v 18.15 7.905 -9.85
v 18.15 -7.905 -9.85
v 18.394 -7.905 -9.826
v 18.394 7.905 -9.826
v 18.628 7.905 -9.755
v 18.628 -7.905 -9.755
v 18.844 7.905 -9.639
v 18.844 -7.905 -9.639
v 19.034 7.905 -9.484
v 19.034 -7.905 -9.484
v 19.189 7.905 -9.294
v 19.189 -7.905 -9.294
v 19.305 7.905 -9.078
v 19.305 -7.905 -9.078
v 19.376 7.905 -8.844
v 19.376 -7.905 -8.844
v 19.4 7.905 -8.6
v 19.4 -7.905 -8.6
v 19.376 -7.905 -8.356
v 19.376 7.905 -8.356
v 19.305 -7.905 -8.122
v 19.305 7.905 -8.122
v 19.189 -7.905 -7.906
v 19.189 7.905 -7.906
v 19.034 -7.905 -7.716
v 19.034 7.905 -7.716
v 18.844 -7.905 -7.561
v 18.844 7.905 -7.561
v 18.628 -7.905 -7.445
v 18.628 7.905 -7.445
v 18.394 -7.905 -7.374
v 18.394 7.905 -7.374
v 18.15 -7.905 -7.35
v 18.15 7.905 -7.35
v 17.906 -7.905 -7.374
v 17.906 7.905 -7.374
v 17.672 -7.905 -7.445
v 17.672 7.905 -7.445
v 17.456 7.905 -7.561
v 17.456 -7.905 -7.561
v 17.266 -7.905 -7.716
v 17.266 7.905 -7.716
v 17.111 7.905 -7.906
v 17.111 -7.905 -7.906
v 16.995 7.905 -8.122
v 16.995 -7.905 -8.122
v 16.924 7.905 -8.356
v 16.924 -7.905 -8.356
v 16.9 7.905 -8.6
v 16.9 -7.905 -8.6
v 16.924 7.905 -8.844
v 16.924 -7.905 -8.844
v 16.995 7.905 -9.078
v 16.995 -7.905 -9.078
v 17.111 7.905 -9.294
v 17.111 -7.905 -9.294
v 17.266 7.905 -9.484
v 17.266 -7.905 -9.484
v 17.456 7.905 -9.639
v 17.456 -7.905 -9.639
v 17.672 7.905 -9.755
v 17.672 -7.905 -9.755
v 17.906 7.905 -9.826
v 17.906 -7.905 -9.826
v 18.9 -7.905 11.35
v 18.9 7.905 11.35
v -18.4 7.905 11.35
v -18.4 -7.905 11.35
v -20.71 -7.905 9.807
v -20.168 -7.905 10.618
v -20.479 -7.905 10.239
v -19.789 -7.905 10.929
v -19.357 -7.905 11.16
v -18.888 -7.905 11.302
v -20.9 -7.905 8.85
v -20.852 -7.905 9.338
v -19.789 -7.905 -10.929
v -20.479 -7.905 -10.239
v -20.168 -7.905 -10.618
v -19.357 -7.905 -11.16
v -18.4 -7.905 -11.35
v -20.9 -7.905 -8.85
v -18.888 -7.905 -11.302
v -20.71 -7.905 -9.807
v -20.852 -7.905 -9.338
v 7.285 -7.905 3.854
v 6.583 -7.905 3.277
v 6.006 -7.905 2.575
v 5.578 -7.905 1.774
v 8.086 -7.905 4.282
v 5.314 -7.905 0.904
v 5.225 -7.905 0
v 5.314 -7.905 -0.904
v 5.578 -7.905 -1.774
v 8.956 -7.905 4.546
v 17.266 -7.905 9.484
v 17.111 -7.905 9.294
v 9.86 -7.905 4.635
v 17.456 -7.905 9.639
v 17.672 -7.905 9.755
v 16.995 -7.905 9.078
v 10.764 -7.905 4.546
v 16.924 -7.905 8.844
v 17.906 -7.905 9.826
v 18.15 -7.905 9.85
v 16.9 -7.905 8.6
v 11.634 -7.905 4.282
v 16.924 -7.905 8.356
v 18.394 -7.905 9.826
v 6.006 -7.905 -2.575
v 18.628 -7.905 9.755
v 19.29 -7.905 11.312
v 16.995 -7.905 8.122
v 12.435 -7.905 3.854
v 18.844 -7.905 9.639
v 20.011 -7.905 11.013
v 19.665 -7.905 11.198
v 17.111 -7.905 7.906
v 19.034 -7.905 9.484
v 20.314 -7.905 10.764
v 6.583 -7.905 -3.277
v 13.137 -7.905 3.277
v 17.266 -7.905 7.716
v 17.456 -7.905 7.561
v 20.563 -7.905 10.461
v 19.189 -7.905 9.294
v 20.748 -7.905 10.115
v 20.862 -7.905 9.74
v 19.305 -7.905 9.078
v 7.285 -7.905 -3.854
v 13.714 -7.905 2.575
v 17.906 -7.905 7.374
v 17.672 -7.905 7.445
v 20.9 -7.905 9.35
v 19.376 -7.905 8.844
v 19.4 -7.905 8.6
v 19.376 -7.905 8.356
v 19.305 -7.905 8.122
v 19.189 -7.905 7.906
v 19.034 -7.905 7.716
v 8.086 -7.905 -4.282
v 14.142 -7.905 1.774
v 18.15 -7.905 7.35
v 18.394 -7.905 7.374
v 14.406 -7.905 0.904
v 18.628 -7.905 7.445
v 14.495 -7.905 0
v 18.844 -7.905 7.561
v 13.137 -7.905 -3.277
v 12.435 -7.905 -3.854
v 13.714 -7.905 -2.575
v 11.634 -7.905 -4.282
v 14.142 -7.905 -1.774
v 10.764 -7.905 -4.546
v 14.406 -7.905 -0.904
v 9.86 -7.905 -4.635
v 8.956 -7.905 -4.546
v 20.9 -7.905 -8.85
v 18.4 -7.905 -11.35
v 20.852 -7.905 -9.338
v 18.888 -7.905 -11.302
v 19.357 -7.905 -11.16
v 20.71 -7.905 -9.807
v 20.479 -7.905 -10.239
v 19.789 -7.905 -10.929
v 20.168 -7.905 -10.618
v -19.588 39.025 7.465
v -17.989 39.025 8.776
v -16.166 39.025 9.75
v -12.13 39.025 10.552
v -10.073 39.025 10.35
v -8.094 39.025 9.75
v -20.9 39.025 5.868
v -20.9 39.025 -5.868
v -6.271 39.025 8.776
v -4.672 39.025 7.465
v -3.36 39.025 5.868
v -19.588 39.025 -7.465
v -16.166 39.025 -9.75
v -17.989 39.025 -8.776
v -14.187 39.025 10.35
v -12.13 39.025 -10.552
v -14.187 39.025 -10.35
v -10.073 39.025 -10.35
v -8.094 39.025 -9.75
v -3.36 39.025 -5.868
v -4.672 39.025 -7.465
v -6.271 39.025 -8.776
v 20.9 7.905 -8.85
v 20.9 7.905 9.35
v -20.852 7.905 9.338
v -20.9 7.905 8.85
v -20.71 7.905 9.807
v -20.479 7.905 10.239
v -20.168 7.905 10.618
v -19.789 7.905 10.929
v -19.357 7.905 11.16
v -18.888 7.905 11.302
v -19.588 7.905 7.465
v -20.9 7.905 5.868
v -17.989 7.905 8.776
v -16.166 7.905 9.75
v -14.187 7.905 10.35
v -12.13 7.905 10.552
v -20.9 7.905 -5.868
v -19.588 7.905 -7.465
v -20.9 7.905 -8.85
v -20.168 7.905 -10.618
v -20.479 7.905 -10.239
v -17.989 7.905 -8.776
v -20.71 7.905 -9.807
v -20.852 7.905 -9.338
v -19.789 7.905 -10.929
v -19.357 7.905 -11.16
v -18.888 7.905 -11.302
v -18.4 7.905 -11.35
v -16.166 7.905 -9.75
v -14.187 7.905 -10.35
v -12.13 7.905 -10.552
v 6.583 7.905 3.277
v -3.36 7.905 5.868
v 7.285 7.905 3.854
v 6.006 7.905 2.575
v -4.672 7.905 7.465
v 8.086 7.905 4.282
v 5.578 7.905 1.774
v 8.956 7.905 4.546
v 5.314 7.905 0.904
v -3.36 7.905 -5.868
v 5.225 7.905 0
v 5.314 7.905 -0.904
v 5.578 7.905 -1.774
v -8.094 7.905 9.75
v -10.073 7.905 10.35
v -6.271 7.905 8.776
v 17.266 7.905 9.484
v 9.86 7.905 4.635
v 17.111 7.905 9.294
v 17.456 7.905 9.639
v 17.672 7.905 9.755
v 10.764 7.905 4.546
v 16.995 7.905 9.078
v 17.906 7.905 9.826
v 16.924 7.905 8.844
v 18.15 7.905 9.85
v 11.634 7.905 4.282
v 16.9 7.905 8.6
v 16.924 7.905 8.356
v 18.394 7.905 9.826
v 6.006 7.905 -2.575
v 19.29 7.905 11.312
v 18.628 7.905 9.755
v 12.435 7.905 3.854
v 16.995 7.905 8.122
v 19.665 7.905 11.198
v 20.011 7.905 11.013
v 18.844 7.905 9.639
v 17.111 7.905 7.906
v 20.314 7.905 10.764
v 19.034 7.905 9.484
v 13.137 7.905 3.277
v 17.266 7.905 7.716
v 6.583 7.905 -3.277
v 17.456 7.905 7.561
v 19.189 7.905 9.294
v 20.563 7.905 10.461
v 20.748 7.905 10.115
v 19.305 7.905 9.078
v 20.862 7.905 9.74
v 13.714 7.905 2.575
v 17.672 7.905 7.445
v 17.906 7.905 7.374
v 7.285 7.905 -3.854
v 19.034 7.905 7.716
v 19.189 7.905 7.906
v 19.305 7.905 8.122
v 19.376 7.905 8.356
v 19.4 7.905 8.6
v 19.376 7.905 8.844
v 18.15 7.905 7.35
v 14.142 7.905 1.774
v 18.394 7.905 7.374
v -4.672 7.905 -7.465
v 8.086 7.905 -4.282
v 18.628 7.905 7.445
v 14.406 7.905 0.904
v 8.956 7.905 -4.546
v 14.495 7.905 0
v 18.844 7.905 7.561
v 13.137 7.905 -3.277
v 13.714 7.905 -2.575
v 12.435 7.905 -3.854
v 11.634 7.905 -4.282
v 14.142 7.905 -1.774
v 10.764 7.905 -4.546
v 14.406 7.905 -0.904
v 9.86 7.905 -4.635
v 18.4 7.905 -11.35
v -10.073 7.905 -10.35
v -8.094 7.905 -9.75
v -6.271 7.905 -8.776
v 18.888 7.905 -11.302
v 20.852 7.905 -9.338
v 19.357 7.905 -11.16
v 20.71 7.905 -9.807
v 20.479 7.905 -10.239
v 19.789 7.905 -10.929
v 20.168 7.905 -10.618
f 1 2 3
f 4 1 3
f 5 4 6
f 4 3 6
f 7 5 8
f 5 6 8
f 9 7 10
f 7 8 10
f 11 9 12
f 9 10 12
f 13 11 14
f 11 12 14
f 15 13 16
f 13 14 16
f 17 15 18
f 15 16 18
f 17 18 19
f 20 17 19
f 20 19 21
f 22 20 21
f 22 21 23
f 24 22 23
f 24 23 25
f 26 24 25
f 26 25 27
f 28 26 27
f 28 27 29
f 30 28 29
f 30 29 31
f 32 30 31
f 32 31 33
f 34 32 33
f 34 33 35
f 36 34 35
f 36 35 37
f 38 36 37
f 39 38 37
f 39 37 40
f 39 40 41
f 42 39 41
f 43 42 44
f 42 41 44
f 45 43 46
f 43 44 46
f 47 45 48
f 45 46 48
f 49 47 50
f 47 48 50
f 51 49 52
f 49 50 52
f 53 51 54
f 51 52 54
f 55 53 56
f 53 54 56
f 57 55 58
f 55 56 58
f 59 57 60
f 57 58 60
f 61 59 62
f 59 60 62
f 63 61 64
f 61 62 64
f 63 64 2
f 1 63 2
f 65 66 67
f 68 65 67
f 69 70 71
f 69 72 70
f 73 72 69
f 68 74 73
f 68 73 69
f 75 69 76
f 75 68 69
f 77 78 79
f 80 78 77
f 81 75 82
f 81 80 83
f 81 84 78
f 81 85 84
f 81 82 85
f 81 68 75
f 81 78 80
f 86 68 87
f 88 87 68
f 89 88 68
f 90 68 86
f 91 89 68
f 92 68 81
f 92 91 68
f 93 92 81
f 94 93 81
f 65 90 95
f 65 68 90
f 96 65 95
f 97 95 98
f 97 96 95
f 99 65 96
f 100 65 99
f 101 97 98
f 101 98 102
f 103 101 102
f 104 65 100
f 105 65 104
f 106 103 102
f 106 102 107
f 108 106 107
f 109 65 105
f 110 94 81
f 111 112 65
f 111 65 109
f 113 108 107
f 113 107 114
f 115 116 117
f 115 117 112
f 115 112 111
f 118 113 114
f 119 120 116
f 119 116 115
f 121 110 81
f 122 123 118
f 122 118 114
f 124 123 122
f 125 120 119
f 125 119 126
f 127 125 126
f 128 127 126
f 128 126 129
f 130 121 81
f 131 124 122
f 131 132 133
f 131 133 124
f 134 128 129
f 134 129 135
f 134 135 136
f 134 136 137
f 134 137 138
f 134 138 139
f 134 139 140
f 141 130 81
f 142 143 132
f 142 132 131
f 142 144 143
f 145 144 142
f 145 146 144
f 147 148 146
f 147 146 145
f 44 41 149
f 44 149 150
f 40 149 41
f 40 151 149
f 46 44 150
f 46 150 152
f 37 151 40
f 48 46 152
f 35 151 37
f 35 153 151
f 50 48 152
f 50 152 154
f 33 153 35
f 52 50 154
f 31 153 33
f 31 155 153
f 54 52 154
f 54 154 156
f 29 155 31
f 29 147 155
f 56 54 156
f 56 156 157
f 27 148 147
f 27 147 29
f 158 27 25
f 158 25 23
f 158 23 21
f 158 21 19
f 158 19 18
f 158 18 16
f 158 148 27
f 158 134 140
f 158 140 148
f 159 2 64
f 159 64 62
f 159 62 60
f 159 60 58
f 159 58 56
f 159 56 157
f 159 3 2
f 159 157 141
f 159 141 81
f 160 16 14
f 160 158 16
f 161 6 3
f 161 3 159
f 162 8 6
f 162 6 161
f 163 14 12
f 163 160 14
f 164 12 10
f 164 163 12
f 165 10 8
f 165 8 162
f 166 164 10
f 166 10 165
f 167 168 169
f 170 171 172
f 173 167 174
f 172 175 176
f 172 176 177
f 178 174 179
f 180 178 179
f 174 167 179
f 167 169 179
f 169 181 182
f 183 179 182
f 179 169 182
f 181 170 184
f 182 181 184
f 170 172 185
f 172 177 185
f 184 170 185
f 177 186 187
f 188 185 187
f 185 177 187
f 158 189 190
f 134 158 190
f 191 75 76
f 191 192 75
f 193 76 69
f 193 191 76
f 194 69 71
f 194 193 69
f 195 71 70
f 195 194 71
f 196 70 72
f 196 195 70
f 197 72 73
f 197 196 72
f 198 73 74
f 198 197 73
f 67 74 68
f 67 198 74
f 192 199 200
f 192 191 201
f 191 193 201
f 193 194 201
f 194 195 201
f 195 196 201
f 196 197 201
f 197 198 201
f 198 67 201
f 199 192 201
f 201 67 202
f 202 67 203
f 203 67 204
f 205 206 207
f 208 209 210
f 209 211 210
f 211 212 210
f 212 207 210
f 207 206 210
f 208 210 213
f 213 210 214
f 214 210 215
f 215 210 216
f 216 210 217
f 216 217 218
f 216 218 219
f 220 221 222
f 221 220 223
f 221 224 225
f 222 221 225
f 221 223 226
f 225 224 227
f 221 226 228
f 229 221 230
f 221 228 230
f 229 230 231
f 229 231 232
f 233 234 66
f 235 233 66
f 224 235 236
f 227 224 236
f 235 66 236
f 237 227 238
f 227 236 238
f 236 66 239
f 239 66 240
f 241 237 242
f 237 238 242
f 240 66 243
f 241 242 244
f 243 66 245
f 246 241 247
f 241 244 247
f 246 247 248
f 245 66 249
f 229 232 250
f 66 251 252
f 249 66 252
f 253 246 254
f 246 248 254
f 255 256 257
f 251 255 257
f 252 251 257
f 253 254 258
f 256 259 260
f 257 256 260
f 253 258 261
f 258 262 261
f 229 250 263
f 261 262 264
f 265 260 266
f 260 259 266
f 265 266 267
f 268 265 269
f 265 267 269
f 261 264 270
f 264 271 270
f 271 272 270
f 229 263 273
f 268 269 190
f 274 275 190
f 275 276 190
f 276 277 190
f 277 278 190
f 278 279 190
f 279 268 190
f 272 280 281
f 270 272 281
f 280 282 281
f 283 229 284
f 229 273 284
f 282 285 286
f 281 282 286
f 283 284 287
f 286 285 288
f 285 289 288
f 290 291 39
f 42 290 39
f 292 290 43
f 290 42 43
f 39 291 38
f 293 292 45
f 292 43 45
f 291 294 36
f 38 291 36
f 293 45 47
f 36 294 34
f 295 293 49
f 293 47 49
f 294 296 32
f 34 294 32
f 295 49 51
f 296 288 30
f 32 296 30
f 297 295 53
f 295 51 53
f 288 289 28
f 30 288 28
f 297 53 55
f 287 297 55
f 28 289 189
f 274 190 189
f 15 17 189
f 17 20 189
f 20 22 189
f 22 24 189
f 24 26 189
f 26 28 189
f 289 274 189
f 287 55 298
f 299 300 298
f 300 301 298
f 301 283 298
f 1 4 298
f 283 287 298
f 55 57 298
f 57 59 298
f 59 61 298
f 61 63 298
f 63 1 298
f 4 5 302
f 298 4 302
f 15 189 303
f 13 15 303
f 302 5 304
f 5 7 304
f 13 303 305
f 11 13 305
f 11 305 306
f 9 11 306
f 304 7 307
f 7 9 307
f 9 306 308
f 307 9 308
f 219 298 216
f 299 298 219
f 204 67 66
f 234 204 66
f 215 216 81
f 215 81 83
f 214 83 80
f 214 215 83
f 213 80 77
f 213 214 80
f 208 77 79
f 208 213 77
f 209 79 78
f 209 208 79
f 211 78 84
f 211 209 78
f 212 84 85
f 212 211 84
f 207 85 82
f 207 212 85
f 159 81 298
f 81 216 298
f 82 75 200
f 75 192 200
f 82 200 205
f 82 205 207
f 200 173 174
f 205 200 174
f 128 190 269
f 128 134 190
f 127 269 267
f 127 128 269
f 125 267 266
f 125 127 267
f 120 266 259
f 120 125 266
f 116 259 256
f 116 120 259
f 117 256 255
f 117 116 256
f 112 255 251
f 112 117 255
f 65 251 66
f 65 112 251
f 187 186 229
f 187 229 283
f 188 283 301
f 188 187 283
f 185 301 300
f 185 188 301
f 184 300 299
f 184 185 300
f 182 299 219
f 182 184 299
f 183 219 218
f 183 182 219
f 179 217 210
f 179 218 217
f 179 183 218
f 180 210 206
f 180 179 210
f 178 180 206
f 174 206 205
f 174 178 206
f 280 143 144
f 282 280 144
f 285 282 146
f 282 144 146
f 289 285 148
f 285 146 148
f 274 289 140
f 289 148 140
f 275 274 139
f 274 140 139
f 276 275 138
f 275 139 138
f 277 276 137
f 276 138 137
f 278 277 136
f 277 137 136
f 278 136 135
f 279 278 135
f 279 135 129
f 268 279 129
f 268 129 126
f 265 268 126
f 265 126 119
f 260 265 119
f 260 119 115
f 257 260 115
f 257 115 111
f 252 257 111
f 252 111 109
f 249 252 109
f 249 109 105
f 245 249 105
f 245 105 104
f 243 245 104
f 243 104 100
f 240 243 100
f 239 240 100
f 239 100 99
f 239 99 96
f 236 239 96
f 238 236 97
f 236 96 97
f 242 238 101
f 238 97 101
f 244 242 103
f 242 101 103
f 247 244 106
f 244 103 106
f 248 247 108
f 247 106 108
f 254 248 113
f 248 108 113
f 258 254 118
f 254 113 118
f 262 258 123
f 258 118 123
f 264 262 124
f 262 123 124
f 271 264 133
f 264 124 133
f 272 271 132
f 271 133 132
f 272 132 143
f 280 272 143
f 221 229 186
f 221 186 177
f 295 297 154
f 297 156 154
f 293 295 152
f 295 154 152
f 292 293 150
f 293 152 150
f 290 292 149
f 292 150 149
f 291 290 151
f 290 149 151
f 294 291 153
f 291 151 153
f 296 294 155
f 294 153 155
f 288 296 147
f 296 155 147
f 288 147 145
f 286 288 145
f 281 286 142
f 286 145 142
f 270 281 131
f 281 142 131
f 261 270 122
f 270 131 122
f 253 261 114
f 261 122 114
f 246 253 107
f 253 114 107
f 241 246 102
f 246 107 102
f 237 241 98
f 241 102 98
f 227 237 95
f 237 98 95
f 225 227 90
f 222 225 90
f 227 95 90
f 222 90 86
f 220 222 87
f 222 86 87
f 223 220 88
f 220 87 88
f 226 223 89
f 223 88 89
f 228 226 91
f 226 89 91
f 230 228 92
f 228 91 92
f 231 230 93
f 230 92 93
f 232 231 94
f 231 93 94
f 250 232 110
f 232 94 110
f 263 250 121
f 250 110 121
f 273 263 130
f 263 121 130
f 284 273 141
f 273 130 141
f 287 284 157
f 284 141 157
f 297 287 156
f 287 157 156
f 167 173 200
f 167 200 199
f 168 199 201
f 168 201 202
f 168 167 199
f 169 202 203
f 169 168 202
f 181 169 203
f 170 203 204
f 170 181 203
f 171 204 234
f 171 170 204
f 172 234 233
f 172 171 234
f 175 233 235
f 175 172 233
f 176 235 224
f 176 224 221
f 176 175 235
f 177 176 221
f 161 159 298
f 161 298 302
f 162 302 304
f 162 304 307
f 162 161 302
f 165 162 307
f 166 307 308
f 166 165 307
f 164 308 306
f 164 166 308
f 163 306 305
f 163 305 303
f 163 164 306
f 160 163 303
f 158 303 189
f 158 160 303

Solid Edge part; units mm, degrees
sketch "Sketch1" plane through (0, 0, 0) normal (0, -1, 0) x (1, 0, 0)
  line L0 (-20.9, -11.35) -> (20.9, -11.35)
  line L1 (20.9, -11.35) -> (20.9, 11.35)
  line L2 (20.9, 11.35) -> (-20.9, 11.35)
  line L3 (-20.9, 11.35) -> (-20.9, -11.35)
extrude "Protrusion1" add sketch "Sketch1" along normal mid plane 15.81
sketch "Sketch2" plane through (0, 7.905, 0) normal (0, 1, 0) x (1, 0, 0)
  line L0 (-20.9, 11.35) -> (-3.36, 11.35)
  line L1 (-3.36, 11.35) -> (-3.36, -11.35)
  line L2 (-3.36, -11.35) -> (-20.9, -11.35)
  line L3 (-20.9, -11.35) -> (-20.9, 11.35)
extrude "Ajout_matière_2" add sketch "Sketch2" along normal blind 31.12 and the other way blind 0.01
hole "Perçage_1" at (18.15, -7.905, 8.6) direction (0, 1, 0) diameter 2.5 end through all
hole "Hole1" at (18.15, -7.905, -8.6) direction (0, 1, 0) diameter 2.5 end through all
hole "Perçage_4" at (9.86, -7.905, 0) direction (0, 1, 0) diameter 9.27 end through all
fillet "Congé_1" radius 2.5 3 edges at (20.9, 0, -11.35) (-20.9, 15.56, 11.35) (-20.9, 15.56, -11.35)
fillet "Congé_1" radius 2 1 edges at (20.9, 0, 11.35)
sketch "Sketch3" plane through (-12.13, 39.025, 0) normal (0, 1, 0) x (1, 0, 0)
  line L0 (8.77, 5.8678) -> (8.77, 11.35)
  line L1 (8.77, 11.35) -> (-8.77, 11.35)
  line L2 (-8.77, 11.35) -> (-8.77, 5.8678)
  arc A0 (-8.77, 5.8678) -> (8.77, 5.8678) centre (0, 0) cw
extrude "Cutout1" cut sketch "Sketch3" against normal blind 31.12
mirror "Mirror1" about plane through (0, 0, 0) normal (0, 0, 1) of "Cutout1"
properties part number "17" material "MDF 3mm"
